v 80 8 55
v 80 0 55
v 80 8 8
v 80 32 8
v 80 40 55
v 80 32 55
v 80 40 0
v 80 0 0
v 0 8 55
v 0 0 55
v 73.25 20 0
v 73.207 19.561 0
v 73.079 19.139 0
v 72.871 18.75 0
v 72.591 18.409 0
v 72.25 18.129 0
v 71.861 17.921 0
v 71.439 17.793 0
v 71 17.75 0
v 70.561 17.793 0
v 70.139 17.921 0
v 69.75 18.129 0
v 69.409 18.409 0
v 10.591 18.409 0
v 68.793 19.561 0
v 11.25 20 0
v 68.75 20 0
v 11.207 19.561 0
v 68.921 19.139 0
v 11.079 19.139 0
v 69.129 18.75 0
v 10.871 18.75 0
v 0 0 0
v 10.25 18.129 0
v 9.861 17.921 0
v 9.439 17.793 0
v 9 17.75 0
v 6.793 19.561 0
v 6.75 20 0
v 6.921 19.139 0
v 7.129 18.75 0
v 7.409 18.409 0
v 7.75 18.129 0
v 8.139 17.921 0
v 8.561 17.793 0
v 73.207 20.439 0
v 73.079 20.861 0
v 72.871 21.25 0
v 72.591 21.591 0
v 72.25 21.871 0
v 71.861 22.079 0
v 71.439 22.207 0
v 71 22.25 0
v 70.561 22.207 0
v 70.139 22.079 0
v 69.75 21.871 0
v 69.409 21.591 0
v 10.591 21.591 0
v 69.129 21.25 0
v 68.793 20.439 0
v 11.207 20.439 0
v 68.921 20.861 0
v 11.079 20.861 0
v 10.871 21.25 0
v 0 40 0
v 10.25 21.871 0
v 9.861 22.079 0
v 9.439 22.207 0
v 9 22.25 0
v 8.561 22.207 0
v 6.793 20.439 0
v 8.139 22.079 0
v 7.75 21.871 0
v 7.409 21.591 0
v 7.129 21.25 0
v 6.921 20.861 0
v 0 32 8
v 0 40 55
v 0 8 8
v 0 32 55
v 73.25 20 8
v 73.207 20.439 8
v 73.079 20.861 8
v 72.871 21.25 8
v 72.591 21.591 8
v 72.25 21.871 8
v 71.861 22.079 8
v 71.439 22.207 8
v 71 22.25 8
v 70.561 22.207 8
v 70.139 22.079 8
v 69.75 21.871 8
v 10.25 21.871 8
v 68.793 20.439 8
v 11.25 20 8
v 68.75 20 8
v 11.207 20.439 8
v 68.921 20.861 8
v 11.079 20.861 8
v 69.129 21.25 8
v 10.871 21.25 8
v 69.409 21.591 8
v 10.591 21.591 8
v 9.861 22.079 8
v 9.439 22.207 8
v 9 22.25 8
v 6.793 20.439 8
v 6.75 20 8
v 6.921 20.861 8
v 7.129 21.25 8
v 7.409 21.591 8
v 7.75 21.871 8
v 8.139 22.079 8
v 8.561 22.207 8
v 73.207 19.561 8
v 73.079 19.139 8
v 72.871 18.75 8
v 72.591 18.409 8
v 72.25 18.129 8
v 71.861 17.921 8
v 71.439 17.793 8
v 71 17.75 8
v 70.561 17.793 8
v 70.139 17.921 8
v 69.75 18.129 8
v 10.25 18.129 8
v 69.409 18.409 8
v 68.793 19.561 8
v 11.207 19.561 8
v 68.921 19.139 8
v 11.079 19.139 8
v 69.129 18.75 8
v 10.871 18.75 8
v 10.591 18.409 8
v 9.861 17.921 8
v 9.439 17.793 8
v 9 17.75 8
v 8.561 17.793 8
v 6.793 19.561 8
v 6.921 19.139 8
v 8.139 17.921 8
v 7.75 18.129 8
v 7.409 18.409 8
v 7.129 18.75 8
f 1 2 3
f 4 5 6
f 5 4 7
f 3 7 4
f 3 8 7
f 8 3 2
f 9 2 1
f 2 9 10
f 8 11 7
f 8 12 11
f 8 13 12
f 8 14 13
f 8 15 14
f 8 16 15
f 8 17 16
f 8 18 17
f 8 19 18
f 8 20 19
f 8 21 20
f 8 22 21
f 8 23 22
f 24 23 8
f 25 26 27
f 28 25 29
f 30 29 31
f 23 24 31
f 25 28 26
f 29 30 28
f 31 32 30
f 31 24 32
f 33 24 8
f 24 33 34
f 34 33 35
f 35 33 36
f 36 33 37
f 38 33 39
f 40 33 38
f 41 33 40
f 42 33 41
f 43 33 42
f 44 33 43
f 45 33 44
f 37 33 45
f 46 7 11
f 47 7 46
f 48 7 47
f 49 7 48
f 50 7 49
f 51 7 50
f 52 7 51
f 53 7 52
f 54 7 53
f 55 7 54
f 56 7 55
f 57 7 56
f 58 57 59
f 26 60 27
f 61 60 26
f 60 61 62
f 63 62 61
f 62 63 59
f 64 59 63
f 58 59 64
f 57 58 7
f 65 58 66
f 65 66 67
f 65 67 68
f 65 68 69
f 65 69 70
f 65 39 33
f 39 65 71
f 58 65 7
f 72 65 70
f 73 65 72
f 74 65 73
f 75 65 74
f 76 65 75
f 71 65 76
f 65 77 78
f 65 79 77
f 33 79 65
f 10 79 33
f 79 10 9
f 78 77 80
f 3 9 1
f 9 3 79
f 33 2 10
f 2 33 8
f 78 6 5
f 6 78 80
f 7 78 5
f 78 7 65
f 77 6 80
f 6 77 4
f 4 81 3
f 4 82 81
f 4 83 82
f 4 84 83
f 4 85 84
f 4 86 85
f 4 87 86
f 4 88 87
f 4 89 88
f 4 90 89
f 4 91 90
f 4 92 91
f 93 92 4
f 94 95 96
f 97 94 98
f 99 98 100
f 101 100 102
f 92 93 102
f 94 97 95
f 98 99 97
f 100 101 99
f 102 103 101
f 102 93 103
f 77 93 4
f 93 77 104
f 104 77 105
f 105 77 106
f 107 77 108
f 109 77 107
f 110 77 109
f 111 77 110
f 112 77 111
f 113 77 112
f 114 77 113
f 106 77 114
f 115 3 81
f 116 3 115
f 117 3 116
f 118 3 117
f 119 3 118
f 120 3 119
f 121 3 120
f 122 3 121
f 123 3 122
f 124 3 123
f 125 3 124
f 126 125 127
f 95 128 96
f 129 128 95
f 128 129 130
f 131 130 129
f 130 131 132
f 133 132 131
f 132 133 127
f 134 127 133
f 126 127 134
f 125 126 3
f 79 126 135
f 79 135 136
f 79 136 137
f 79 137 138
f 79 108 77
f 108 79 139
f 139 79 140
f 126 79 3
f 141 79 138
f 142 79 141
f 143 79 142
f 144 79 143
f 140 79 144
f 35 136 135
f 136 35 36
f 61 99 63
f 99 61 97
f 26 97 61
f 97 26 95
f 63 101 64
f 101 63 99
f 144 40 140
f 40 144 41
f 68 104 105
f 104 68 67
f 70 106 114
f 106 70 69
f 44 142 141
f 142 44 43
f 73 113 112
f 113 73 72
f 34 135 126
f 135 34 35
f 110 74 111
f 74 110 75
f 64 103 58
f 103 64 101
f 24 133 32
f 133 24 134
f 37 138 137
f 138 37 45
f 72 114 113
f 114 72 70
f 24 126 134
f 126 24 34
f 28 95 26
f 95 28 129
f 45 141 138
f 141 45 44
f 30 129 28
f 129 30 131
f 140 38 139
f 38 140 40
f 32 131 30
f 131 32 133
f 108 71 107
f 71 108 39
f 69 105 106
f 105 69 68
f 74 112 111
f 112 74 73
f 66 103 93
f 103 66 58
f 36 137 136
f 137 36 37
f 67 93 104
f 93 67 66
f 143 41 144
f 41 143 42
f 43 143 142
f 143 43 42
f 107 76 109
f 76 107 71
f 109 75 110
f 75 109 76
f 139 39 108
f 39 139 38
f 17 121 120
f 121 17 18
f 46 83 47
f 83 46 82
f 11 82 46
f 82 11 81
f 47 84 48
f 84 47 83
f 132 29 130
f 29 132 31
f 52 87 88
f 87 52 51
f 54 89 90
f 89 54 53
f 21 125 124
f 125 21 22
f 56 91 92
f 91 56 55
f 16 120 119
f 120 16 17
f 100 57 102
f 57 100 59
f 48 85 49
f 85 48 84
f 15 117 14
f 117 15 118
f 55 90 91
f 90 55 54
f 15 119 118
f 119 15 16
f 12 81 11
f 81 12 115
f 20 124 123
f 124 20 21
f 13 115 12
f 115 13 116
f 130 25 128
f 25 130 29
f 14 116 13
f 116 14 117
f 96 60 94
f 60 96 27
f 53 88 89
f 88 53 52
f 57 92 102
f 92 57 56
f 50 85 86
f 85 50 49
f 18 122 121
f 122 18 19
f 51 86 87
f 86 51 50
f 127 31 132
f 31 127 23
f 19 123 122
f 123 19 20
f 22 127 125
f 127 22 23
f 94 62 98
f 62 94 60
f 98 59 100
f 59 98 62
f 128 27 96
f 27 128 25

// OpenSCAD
$fn = 32;

// ----------------------------------------------------------------------
// U-bracket: 80 x 40 x 55 mm
// ----------------------------------------------------------------------

// --- parameters (mm) ---
rail_len = 80;            // outer length, X
jaw_w = 40;               // outer width, Y
jaw_h = 55;               // upright height, Z
web_t = 8;                // wall thickness
hole_d = 4.5;             // clearance for M4

module hole_z(px, py) {
  translate([px, py, -2.5]) cylinder(h = web_t + 5, d = hole_d);
}
module hole_y_pz(pz) {
  /* through both uprights along Y */
  translate([0, -2.5, pz]) rotate([-90, 0, 0]) cylinder(h = jaw_w + 5, d = hole_d);
}

module base() {
  cube([rail_len, jaw_w, web_t]);
}

module uprights() {
  cube([rail_len, web_t, jaw_h]);
  translate([0, jaw_w - web_t, 0]) cube([rail_len, web_t, jaw_h]);
}

difference() {
  union() {
    base();
    uprights();
  }
  hole_z(9, 20);
  hole_z(71, 20);
}
